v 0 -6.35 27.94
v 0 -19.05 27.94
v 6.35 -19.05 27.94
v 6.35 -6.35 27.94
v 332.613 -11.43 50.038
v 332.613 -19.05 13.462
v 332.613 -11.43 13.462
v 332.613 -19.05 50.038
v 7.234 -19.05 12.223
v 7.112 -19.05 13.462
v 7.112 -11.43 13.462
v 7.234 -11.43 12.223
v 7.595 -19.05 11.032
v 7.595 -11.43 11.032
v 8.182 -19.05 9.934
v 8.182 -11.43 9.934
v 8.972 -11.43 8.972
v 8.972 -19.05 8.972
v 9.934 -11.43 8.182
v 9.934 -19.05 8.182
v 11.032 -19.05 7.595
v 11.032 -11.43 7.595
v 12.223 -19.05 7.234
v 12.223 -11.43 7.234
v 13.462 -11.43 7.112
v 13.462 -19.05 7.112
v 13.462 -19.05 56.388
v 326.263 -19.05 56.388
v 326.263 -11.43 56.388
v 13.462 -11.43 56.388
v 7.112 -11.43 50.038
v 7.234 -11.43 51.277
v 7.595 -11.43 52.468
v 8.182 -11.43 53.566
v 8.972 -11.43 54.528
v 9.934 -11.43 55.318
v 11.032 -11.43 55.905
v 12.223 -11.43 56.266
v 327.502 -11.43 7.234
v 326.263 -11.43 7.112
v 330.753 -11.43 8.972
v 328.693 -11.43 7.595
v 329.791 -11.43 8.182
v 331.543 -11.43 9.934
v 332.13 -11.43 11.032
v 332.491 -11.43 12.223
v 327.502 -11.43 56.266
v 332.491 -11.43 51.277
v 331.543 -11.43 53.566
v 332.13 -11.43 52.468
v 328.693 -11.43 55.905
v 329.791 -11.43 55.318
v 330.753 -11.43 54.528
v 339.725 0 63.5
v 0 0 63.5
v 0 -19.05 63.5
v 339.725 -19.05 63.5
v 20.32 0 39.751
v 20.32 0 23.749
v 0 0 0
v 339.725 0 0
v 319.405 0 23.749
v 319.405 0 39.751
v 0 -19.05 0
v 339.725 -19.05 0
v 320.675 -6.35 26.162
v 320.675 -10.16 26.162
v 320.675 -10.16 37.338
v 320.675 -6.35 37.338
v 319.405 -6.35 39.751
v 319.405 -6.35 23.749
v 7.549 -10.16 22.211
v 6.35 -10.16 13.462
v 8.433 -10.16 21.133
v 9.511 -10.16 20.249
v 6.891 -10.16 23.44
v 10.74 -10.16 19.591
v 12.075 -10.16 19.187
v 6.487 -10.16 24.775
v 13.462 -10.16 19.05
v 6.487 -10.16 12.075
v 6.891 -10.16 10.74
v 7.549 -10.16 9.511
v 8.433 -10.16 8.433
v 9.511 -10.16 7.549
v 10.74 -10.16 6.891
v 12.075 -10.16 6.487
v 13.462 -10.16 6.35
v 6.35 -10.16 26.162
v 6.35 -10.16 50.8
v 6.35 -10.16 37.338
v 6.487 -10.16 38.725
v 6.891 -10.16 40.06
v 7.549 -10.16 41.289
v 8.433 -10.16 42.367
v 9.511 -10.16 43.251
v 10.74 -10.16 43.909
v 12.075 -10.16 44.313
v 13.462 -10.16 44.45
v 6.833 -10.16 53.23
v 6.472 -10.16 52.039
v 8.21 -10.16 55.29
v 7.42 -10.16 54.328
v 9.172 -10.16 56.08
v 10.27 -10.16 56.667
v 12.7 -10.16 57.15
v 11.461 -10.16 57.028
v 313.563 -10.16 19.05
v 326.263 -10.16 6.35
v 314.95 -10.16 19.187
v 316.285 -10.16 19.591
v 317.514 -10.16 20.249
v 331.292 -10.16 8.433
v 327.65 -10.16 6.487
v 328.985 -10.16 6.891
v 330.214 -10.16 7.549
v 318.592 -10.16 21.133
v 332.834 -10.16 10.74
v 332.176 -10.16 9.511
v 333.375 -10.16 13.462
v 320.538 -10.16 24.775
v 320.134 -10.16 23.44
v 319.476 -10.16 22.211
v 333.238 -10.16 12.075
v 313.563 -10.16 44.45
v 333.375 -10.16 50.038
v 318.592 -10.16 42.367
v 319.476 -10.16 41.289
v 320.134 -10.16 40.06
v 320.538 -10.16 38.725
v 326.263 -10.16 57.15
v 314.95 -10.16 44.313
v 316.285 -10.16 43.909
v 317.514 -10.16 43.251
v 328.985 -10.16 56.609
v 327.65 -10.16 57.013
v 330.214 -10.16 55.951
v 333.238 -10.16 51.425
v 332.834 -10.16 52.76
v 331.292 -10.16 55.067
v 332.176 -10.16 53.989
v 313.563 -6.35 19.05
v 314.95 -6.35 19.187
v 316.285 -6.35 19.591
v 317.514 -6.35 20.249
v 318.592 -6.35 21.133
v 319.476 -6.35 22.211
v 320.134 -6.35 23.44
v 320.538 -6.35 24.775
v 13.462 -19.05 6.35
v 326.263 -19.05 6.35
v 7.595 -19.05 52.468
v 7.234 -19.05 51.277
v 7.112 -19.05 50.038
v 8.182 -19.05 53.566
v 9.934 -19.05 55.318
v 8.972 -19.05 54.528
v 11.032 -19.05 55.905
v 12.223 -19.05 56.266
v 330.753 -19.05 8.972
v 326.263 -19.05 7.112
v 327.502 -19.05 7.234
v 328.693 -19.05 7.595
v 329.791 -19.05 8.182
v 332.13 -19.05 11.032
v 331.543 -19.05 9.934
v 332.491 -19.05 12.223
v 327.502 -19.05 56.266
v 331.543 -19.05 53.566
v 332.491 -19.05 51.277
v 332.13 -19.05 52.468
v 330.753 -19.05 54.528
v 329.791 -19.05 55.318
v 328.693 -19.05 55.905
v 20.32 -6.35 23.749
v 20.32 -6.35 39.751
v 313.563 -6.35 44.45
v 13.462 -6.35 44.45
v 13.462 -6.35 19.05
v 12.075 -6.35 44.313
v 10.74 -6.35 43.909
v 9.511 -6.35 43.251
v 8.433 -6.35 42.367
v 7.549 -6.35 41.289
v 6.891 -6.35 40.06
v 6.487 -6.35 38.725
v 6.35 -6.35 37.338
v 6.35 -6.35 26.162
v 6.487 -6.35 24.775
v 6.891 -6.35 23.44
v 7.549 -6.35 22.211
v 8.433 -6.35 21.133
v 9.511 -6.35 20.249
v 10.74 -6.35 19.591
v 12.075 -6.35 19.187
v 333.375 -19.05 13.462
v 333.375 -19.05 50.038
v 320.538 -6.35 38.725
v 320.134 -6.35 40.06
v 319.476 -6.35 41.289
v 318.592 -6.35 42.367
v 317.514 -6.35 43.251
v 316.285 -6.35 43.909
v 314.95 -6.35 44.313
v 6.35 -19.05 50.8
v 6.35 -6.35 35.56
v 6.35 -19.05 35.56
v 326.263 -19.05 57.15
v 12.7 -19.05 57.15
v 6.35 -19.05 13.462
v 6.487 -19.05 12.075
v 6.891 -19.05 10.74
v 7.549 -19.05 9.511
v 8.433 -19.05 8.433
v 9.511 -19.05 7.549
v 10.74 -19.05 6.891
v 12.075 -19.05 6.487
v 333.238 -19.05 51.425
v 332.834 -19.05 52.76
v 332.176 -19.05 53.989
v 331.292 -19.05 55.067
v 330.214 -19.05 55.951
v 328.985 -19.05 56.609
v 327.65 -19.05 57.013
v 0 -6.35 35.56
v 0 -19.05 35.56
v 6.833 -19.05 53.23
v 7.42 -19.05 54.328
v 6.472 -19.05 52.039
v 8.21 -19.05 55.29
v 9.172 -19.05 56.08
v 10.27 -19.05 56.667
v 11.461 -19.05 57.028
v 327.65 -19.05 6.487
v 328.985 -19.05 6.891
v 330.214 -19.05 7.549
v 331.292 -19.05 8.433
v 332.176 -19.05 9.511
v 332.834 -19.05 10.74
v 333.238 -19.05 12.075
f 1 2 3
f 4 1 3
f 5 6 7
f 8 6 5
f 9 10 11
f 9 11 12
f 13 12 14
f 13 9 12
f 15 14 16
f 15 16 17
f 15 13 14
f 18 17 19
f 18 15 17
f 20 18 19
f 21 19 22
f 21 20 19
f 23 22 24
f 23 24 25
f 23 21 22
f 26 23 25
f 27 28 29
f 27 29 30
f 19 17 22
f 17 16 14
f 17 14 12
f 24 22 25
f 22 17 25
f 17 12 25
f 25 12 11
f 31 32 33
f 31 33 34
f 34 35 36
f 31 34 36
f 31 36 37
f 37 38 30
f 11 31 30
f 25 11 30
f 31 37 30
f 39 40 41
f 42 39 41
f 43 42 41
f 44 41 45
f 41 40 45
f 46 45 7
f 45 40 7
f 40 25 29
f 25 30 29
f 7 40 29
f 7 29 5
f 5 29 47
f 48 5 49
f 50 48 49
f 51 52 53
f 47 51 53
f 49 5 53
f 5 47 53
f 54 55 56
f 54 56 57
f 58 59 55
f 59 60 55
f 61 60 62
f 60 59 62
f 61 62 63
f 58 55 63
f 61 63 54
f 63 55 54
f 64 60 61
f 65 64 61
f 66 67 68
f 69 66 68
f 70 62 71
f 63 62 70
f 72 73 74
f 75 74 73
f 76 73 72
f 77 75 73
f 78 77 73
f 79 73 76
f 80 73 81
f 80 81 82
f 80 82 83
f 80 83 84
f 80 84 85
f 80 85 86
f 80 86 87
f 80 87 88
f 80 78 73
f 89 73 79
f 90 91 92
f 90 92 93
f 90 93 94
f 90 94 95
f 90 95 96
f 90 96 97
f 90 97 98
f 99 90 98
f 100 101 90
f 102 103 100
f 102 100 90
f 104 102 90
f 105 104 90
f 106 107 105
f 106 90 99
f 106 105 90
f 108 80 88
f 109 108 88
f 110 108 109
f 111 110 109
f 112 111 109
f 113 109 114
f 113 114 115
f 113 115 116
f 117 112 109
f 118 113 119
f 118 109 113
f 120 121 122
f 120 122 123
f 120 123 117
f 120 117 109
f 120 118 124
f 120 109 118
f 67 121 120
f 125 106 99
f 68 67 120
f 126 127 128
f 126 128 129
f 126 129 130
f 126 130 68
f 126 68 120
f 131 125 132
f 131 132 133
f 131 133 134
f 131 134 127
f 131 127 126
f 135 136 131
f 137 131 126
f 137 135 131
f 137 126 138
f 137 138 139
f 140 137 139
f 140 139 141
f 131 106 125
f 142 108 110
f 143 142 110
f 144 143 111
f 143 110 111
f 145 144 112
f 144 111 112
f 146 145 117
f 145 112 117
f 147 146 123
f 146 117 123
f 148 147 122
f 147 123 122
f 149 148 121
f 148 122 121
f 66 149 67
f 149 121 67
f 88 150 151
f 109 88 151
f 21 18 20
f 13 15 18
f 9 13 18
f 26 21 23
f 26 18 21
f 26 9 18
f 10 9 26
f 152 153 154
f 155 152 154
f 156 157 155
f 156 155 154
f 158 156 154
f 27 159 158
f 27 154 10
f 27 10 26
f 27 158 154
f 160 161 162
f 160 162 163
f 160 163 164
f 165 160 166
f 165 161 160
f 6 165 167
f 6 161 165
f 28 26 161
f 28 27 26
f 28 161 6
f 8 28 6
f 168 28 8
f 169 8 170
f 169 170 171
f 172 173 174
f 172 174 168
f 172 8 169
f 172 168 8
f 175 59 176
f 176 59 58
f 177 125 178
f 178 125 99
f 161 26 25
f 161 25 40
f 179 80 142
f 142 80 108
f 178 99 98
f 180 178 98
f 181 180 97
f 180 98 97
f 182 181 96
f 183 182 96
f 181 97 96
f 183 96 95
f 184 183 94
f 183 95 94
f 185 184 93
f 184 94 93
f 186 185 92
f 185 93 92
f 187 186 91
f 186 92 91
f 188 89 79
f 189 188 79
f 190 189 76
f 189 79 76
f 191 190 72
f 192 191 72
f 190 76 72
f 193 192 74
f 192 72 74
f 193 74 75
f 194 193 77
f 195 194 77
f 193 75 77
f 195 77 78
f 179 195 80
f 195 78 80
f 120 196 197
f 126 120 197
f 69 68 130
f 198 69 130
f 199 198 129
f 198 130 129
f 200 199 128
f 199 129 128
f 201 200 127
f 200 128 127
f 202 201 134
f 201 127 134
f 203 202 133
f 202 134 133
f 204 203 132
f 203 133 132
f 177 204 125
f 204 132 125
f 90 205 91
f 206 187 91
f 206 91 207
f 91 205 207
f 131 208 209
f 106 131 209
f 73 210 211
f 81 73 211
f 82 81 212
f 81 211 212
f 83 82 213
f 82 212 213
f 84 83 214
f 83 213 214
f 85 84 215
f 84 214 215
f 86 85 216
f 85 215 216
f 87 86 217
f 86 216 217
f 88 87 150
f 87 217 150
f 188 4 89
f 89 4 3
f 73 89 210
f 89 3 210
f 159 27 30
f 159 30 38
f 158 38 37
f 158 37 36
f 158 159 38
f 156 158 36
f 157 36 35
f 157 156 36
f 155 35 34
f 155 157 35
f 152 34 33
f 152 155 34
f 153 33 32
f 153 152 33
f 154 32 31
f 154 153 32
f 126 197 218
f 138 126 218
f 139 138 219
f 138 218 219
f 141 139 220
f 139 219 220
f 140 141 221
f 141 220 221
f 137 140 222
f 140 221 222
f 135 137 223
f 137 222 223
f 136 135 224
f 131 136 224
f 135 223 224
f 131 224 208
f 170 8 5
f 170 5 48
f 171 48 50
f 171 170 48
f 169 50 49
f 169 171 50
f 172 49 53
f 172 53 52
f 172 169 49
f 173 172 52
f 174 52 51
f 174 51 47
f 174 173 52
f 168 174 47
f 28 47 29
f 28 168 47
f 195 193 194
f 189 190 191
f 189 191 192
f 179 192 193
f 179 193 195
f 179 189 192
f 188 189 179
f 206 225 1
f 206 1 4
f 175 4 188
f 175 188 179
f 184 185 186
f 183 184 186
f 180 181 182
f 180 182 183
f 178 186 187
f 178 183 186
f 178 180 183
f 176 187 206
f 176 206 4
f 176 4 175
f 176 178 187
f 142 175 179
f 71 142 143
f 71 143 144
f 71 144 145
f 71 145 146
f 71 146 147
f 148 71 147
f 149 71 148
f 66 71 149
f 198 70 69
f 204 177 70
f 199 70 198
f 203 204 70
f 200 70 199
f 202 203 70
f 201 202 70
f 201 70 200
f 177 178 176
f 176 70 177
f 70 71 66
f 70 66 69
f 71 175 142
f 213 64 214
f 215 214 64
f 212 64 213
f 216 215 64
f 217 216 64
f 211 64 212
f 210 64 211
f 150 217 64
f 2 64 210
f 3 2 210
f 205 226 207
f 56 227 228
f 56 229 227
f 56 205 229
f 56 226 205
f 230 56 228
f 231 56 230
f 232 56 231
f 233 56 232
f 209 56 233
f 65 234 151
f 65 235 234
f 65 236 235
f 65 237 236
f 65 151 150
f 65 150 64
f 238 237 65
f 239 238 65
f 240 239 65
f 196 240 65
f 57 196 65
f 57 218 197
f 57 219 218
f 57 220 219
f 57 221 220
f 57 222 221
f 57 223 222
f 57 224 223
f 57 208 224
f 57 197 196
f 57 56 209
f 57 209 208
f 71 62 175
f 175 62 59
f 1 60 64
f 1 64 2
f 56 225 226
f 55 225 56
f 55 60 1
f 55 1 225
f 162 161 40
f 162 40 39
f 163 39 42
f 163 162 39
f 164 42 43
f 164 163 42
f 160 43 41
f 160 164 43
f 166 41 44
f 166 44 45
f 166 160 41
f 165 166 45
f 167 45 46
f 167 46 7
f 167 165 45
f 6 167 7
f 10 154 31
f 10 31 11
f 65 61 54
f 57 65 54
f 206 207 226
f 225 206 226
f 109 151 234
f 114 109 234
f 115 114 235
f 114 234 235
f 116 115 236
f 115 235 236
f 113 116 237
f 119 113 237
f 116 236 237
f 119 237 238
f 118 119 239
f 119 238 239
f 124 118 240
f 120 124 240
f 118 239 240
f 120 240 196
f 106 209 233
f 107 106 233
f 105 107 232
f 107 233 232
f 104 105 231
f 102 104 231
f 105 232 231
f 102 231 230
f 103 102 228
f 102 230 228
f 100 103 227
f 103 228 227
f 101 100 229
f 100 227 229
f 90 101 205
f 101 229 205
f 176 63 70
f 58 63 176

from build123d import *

# Parameters (mm, degrees)
F0_W     = 339.725
F0_H     = 63.5
F1_DEPTH = 19.05
F3_DEPTH = 12.7
F5_DEPTH = 8.89
F7_DEPTH = 7.62
F8_W     = 299.085
F8_H     = 16.002
F9_DEPTH = 25.4


with BuildPart() as f1:
    # F0 (on Front) → F1 (new body)
    with BuildSketch(Plane.XZ):
        with Locations((169.8625, 31.75)):
            Rectangle(F0_W, F0_H)
    extrude(amount=F1_DEPTH)

    # F2 (on face) → F3 (cut)
    with BuildSketch(Plane.XZ.offset(19.05)):
        with BuildLine():
            Line((313.563, 44.45), (13.462, 44.45))
            ThreePointArc((13.462, 44.45), (8.4330565722, 42.3669434278), (6.35, 37.338))
            Line((6.35, 37.338), (6.35, 35.56))
            Line((6.35, 35.56), (0, 35.56))
            Line((0, 35.56), (0, 27.94))
            Line((0, 27.94), (6.35, 27.94))
            Line((6.35, 27.94), (6.35, 26.162))
            ThreePointArc((6.35, 26.162), (8.4330565722, 21.1330565722), (13.462, 19.05))
            Line((13.462, 19.05), (313.563, 19.05))
            ThreePointArc((313.563, 19.05), (318.5919434278, 21.1330565722), (320.675, 26.162))
            Line((320.675, 26.162), (320.675, 37.338))
            ThreePointArc((320.675, 37.338), (318.5919434278, 42.3669434278), (313.563, 44.45))
        make_face()
    extrude(amount=-F3_DEPTH, mode=Mode.SUBTRACT)

    # F4 (on face) → F5 (cut)
    with BuildSketch(Plane.XZ.offset(19.05)):
        with BuildLine():
            Line((326.263, 57.15), (12.7, 57.15))
            ThreePointArc((12.7, 57.15), (8.2098719395, 55.2901280605), (6.35, 50.8))
            Line((6.35, 50.8), (6.35, 37.338))
            ThreePointArc((6.35, 37.338), (8.4330565722, 42.3669434278), (13.462, 44.45))
            Line((13.462, 44.45), (313.563, 44.45))
            ThreePointArc((313.563, 44.45), (318.5919434278, 42.3669434278), (320.675, 37.338))
            Line((320.675, 37.338), (320.675, 26.162))
            ThreePointArc((320.675, 26.162), (318.5919434278, 21.1330565722), (313.563, 19.05))
            Line((313.563, 19.05), (13.462, 19.05))
            ThreePointArc((13.462, 19.05), (8.4330565722, 21.1330565722), (6.35, 26.162))
            Line((6.35, 26.162), (6.35, 13.462))
            ThreePointArc((6.35, 13.462), (8.4330565722, 8.4330565722), (13.462, 6.35))
            Line((13.462, 6.35), (326.263, 6.35))
            ThreePointArc((326.263, 6.35), (331.2919434278, 8.4330565722), (333.375, 13.462))
            Line((333.375, 13.462), (333.375, 50.038))
            ThreePointArc((333.375, 50.038), (331.2919434278, 55.0669434278), (326.263, 57.15))
        make_face()
    extrude(amount=-F5_DEPTH, mode=Mode.SUBTRACT)

    # F8 (on face) → F9 (cut)
    with BuildSketch(Plane(origin=(0, 0, 0), x_dir=(-1, 0, 0), z_dir=(0, 1, 0))):
        with Locations((-169.8625, 31.75)):
            Rectangle(F8_W, F8_H)
    extrude(amount=-F9_DEPTH, mode=Mode.SUBTRACT)


with BuildPart() as f7:
    # F6 (on face) → F7 (new body)
    with BuildSketch(Plane.XZ.offset(19.05)):
        with BuildLine():
            Line((326.263, 56.388), (13.462, 56.388))
            ThreePointArc((13.462, 56.388), (8.9718719395, 54.5281280605), (7.112, 50.038))
            Line((7.112, 50.038), (7.112, 13.462))
            ThreePointArc((7.112, 13.462), (8.9718719395, 8.9718719395), (13.462, 7.112))
            Line((13.462, 7.112), (326.263, 7.112))
            ThreePointArc((326.263, 7.112), (330.7531280605, 8.9718719395), (332.613, 13.462))
            Line((332.613, 13.462), (332.613, 50.038))
            ThreePointArc((332.613, 50.038), (330.7531280605, 54.5281280605), (326.263, 56.388))
        make_face()
    extrude(amount=-F7_DEPTH)


solid = Compound([f1.part, f7.part])
